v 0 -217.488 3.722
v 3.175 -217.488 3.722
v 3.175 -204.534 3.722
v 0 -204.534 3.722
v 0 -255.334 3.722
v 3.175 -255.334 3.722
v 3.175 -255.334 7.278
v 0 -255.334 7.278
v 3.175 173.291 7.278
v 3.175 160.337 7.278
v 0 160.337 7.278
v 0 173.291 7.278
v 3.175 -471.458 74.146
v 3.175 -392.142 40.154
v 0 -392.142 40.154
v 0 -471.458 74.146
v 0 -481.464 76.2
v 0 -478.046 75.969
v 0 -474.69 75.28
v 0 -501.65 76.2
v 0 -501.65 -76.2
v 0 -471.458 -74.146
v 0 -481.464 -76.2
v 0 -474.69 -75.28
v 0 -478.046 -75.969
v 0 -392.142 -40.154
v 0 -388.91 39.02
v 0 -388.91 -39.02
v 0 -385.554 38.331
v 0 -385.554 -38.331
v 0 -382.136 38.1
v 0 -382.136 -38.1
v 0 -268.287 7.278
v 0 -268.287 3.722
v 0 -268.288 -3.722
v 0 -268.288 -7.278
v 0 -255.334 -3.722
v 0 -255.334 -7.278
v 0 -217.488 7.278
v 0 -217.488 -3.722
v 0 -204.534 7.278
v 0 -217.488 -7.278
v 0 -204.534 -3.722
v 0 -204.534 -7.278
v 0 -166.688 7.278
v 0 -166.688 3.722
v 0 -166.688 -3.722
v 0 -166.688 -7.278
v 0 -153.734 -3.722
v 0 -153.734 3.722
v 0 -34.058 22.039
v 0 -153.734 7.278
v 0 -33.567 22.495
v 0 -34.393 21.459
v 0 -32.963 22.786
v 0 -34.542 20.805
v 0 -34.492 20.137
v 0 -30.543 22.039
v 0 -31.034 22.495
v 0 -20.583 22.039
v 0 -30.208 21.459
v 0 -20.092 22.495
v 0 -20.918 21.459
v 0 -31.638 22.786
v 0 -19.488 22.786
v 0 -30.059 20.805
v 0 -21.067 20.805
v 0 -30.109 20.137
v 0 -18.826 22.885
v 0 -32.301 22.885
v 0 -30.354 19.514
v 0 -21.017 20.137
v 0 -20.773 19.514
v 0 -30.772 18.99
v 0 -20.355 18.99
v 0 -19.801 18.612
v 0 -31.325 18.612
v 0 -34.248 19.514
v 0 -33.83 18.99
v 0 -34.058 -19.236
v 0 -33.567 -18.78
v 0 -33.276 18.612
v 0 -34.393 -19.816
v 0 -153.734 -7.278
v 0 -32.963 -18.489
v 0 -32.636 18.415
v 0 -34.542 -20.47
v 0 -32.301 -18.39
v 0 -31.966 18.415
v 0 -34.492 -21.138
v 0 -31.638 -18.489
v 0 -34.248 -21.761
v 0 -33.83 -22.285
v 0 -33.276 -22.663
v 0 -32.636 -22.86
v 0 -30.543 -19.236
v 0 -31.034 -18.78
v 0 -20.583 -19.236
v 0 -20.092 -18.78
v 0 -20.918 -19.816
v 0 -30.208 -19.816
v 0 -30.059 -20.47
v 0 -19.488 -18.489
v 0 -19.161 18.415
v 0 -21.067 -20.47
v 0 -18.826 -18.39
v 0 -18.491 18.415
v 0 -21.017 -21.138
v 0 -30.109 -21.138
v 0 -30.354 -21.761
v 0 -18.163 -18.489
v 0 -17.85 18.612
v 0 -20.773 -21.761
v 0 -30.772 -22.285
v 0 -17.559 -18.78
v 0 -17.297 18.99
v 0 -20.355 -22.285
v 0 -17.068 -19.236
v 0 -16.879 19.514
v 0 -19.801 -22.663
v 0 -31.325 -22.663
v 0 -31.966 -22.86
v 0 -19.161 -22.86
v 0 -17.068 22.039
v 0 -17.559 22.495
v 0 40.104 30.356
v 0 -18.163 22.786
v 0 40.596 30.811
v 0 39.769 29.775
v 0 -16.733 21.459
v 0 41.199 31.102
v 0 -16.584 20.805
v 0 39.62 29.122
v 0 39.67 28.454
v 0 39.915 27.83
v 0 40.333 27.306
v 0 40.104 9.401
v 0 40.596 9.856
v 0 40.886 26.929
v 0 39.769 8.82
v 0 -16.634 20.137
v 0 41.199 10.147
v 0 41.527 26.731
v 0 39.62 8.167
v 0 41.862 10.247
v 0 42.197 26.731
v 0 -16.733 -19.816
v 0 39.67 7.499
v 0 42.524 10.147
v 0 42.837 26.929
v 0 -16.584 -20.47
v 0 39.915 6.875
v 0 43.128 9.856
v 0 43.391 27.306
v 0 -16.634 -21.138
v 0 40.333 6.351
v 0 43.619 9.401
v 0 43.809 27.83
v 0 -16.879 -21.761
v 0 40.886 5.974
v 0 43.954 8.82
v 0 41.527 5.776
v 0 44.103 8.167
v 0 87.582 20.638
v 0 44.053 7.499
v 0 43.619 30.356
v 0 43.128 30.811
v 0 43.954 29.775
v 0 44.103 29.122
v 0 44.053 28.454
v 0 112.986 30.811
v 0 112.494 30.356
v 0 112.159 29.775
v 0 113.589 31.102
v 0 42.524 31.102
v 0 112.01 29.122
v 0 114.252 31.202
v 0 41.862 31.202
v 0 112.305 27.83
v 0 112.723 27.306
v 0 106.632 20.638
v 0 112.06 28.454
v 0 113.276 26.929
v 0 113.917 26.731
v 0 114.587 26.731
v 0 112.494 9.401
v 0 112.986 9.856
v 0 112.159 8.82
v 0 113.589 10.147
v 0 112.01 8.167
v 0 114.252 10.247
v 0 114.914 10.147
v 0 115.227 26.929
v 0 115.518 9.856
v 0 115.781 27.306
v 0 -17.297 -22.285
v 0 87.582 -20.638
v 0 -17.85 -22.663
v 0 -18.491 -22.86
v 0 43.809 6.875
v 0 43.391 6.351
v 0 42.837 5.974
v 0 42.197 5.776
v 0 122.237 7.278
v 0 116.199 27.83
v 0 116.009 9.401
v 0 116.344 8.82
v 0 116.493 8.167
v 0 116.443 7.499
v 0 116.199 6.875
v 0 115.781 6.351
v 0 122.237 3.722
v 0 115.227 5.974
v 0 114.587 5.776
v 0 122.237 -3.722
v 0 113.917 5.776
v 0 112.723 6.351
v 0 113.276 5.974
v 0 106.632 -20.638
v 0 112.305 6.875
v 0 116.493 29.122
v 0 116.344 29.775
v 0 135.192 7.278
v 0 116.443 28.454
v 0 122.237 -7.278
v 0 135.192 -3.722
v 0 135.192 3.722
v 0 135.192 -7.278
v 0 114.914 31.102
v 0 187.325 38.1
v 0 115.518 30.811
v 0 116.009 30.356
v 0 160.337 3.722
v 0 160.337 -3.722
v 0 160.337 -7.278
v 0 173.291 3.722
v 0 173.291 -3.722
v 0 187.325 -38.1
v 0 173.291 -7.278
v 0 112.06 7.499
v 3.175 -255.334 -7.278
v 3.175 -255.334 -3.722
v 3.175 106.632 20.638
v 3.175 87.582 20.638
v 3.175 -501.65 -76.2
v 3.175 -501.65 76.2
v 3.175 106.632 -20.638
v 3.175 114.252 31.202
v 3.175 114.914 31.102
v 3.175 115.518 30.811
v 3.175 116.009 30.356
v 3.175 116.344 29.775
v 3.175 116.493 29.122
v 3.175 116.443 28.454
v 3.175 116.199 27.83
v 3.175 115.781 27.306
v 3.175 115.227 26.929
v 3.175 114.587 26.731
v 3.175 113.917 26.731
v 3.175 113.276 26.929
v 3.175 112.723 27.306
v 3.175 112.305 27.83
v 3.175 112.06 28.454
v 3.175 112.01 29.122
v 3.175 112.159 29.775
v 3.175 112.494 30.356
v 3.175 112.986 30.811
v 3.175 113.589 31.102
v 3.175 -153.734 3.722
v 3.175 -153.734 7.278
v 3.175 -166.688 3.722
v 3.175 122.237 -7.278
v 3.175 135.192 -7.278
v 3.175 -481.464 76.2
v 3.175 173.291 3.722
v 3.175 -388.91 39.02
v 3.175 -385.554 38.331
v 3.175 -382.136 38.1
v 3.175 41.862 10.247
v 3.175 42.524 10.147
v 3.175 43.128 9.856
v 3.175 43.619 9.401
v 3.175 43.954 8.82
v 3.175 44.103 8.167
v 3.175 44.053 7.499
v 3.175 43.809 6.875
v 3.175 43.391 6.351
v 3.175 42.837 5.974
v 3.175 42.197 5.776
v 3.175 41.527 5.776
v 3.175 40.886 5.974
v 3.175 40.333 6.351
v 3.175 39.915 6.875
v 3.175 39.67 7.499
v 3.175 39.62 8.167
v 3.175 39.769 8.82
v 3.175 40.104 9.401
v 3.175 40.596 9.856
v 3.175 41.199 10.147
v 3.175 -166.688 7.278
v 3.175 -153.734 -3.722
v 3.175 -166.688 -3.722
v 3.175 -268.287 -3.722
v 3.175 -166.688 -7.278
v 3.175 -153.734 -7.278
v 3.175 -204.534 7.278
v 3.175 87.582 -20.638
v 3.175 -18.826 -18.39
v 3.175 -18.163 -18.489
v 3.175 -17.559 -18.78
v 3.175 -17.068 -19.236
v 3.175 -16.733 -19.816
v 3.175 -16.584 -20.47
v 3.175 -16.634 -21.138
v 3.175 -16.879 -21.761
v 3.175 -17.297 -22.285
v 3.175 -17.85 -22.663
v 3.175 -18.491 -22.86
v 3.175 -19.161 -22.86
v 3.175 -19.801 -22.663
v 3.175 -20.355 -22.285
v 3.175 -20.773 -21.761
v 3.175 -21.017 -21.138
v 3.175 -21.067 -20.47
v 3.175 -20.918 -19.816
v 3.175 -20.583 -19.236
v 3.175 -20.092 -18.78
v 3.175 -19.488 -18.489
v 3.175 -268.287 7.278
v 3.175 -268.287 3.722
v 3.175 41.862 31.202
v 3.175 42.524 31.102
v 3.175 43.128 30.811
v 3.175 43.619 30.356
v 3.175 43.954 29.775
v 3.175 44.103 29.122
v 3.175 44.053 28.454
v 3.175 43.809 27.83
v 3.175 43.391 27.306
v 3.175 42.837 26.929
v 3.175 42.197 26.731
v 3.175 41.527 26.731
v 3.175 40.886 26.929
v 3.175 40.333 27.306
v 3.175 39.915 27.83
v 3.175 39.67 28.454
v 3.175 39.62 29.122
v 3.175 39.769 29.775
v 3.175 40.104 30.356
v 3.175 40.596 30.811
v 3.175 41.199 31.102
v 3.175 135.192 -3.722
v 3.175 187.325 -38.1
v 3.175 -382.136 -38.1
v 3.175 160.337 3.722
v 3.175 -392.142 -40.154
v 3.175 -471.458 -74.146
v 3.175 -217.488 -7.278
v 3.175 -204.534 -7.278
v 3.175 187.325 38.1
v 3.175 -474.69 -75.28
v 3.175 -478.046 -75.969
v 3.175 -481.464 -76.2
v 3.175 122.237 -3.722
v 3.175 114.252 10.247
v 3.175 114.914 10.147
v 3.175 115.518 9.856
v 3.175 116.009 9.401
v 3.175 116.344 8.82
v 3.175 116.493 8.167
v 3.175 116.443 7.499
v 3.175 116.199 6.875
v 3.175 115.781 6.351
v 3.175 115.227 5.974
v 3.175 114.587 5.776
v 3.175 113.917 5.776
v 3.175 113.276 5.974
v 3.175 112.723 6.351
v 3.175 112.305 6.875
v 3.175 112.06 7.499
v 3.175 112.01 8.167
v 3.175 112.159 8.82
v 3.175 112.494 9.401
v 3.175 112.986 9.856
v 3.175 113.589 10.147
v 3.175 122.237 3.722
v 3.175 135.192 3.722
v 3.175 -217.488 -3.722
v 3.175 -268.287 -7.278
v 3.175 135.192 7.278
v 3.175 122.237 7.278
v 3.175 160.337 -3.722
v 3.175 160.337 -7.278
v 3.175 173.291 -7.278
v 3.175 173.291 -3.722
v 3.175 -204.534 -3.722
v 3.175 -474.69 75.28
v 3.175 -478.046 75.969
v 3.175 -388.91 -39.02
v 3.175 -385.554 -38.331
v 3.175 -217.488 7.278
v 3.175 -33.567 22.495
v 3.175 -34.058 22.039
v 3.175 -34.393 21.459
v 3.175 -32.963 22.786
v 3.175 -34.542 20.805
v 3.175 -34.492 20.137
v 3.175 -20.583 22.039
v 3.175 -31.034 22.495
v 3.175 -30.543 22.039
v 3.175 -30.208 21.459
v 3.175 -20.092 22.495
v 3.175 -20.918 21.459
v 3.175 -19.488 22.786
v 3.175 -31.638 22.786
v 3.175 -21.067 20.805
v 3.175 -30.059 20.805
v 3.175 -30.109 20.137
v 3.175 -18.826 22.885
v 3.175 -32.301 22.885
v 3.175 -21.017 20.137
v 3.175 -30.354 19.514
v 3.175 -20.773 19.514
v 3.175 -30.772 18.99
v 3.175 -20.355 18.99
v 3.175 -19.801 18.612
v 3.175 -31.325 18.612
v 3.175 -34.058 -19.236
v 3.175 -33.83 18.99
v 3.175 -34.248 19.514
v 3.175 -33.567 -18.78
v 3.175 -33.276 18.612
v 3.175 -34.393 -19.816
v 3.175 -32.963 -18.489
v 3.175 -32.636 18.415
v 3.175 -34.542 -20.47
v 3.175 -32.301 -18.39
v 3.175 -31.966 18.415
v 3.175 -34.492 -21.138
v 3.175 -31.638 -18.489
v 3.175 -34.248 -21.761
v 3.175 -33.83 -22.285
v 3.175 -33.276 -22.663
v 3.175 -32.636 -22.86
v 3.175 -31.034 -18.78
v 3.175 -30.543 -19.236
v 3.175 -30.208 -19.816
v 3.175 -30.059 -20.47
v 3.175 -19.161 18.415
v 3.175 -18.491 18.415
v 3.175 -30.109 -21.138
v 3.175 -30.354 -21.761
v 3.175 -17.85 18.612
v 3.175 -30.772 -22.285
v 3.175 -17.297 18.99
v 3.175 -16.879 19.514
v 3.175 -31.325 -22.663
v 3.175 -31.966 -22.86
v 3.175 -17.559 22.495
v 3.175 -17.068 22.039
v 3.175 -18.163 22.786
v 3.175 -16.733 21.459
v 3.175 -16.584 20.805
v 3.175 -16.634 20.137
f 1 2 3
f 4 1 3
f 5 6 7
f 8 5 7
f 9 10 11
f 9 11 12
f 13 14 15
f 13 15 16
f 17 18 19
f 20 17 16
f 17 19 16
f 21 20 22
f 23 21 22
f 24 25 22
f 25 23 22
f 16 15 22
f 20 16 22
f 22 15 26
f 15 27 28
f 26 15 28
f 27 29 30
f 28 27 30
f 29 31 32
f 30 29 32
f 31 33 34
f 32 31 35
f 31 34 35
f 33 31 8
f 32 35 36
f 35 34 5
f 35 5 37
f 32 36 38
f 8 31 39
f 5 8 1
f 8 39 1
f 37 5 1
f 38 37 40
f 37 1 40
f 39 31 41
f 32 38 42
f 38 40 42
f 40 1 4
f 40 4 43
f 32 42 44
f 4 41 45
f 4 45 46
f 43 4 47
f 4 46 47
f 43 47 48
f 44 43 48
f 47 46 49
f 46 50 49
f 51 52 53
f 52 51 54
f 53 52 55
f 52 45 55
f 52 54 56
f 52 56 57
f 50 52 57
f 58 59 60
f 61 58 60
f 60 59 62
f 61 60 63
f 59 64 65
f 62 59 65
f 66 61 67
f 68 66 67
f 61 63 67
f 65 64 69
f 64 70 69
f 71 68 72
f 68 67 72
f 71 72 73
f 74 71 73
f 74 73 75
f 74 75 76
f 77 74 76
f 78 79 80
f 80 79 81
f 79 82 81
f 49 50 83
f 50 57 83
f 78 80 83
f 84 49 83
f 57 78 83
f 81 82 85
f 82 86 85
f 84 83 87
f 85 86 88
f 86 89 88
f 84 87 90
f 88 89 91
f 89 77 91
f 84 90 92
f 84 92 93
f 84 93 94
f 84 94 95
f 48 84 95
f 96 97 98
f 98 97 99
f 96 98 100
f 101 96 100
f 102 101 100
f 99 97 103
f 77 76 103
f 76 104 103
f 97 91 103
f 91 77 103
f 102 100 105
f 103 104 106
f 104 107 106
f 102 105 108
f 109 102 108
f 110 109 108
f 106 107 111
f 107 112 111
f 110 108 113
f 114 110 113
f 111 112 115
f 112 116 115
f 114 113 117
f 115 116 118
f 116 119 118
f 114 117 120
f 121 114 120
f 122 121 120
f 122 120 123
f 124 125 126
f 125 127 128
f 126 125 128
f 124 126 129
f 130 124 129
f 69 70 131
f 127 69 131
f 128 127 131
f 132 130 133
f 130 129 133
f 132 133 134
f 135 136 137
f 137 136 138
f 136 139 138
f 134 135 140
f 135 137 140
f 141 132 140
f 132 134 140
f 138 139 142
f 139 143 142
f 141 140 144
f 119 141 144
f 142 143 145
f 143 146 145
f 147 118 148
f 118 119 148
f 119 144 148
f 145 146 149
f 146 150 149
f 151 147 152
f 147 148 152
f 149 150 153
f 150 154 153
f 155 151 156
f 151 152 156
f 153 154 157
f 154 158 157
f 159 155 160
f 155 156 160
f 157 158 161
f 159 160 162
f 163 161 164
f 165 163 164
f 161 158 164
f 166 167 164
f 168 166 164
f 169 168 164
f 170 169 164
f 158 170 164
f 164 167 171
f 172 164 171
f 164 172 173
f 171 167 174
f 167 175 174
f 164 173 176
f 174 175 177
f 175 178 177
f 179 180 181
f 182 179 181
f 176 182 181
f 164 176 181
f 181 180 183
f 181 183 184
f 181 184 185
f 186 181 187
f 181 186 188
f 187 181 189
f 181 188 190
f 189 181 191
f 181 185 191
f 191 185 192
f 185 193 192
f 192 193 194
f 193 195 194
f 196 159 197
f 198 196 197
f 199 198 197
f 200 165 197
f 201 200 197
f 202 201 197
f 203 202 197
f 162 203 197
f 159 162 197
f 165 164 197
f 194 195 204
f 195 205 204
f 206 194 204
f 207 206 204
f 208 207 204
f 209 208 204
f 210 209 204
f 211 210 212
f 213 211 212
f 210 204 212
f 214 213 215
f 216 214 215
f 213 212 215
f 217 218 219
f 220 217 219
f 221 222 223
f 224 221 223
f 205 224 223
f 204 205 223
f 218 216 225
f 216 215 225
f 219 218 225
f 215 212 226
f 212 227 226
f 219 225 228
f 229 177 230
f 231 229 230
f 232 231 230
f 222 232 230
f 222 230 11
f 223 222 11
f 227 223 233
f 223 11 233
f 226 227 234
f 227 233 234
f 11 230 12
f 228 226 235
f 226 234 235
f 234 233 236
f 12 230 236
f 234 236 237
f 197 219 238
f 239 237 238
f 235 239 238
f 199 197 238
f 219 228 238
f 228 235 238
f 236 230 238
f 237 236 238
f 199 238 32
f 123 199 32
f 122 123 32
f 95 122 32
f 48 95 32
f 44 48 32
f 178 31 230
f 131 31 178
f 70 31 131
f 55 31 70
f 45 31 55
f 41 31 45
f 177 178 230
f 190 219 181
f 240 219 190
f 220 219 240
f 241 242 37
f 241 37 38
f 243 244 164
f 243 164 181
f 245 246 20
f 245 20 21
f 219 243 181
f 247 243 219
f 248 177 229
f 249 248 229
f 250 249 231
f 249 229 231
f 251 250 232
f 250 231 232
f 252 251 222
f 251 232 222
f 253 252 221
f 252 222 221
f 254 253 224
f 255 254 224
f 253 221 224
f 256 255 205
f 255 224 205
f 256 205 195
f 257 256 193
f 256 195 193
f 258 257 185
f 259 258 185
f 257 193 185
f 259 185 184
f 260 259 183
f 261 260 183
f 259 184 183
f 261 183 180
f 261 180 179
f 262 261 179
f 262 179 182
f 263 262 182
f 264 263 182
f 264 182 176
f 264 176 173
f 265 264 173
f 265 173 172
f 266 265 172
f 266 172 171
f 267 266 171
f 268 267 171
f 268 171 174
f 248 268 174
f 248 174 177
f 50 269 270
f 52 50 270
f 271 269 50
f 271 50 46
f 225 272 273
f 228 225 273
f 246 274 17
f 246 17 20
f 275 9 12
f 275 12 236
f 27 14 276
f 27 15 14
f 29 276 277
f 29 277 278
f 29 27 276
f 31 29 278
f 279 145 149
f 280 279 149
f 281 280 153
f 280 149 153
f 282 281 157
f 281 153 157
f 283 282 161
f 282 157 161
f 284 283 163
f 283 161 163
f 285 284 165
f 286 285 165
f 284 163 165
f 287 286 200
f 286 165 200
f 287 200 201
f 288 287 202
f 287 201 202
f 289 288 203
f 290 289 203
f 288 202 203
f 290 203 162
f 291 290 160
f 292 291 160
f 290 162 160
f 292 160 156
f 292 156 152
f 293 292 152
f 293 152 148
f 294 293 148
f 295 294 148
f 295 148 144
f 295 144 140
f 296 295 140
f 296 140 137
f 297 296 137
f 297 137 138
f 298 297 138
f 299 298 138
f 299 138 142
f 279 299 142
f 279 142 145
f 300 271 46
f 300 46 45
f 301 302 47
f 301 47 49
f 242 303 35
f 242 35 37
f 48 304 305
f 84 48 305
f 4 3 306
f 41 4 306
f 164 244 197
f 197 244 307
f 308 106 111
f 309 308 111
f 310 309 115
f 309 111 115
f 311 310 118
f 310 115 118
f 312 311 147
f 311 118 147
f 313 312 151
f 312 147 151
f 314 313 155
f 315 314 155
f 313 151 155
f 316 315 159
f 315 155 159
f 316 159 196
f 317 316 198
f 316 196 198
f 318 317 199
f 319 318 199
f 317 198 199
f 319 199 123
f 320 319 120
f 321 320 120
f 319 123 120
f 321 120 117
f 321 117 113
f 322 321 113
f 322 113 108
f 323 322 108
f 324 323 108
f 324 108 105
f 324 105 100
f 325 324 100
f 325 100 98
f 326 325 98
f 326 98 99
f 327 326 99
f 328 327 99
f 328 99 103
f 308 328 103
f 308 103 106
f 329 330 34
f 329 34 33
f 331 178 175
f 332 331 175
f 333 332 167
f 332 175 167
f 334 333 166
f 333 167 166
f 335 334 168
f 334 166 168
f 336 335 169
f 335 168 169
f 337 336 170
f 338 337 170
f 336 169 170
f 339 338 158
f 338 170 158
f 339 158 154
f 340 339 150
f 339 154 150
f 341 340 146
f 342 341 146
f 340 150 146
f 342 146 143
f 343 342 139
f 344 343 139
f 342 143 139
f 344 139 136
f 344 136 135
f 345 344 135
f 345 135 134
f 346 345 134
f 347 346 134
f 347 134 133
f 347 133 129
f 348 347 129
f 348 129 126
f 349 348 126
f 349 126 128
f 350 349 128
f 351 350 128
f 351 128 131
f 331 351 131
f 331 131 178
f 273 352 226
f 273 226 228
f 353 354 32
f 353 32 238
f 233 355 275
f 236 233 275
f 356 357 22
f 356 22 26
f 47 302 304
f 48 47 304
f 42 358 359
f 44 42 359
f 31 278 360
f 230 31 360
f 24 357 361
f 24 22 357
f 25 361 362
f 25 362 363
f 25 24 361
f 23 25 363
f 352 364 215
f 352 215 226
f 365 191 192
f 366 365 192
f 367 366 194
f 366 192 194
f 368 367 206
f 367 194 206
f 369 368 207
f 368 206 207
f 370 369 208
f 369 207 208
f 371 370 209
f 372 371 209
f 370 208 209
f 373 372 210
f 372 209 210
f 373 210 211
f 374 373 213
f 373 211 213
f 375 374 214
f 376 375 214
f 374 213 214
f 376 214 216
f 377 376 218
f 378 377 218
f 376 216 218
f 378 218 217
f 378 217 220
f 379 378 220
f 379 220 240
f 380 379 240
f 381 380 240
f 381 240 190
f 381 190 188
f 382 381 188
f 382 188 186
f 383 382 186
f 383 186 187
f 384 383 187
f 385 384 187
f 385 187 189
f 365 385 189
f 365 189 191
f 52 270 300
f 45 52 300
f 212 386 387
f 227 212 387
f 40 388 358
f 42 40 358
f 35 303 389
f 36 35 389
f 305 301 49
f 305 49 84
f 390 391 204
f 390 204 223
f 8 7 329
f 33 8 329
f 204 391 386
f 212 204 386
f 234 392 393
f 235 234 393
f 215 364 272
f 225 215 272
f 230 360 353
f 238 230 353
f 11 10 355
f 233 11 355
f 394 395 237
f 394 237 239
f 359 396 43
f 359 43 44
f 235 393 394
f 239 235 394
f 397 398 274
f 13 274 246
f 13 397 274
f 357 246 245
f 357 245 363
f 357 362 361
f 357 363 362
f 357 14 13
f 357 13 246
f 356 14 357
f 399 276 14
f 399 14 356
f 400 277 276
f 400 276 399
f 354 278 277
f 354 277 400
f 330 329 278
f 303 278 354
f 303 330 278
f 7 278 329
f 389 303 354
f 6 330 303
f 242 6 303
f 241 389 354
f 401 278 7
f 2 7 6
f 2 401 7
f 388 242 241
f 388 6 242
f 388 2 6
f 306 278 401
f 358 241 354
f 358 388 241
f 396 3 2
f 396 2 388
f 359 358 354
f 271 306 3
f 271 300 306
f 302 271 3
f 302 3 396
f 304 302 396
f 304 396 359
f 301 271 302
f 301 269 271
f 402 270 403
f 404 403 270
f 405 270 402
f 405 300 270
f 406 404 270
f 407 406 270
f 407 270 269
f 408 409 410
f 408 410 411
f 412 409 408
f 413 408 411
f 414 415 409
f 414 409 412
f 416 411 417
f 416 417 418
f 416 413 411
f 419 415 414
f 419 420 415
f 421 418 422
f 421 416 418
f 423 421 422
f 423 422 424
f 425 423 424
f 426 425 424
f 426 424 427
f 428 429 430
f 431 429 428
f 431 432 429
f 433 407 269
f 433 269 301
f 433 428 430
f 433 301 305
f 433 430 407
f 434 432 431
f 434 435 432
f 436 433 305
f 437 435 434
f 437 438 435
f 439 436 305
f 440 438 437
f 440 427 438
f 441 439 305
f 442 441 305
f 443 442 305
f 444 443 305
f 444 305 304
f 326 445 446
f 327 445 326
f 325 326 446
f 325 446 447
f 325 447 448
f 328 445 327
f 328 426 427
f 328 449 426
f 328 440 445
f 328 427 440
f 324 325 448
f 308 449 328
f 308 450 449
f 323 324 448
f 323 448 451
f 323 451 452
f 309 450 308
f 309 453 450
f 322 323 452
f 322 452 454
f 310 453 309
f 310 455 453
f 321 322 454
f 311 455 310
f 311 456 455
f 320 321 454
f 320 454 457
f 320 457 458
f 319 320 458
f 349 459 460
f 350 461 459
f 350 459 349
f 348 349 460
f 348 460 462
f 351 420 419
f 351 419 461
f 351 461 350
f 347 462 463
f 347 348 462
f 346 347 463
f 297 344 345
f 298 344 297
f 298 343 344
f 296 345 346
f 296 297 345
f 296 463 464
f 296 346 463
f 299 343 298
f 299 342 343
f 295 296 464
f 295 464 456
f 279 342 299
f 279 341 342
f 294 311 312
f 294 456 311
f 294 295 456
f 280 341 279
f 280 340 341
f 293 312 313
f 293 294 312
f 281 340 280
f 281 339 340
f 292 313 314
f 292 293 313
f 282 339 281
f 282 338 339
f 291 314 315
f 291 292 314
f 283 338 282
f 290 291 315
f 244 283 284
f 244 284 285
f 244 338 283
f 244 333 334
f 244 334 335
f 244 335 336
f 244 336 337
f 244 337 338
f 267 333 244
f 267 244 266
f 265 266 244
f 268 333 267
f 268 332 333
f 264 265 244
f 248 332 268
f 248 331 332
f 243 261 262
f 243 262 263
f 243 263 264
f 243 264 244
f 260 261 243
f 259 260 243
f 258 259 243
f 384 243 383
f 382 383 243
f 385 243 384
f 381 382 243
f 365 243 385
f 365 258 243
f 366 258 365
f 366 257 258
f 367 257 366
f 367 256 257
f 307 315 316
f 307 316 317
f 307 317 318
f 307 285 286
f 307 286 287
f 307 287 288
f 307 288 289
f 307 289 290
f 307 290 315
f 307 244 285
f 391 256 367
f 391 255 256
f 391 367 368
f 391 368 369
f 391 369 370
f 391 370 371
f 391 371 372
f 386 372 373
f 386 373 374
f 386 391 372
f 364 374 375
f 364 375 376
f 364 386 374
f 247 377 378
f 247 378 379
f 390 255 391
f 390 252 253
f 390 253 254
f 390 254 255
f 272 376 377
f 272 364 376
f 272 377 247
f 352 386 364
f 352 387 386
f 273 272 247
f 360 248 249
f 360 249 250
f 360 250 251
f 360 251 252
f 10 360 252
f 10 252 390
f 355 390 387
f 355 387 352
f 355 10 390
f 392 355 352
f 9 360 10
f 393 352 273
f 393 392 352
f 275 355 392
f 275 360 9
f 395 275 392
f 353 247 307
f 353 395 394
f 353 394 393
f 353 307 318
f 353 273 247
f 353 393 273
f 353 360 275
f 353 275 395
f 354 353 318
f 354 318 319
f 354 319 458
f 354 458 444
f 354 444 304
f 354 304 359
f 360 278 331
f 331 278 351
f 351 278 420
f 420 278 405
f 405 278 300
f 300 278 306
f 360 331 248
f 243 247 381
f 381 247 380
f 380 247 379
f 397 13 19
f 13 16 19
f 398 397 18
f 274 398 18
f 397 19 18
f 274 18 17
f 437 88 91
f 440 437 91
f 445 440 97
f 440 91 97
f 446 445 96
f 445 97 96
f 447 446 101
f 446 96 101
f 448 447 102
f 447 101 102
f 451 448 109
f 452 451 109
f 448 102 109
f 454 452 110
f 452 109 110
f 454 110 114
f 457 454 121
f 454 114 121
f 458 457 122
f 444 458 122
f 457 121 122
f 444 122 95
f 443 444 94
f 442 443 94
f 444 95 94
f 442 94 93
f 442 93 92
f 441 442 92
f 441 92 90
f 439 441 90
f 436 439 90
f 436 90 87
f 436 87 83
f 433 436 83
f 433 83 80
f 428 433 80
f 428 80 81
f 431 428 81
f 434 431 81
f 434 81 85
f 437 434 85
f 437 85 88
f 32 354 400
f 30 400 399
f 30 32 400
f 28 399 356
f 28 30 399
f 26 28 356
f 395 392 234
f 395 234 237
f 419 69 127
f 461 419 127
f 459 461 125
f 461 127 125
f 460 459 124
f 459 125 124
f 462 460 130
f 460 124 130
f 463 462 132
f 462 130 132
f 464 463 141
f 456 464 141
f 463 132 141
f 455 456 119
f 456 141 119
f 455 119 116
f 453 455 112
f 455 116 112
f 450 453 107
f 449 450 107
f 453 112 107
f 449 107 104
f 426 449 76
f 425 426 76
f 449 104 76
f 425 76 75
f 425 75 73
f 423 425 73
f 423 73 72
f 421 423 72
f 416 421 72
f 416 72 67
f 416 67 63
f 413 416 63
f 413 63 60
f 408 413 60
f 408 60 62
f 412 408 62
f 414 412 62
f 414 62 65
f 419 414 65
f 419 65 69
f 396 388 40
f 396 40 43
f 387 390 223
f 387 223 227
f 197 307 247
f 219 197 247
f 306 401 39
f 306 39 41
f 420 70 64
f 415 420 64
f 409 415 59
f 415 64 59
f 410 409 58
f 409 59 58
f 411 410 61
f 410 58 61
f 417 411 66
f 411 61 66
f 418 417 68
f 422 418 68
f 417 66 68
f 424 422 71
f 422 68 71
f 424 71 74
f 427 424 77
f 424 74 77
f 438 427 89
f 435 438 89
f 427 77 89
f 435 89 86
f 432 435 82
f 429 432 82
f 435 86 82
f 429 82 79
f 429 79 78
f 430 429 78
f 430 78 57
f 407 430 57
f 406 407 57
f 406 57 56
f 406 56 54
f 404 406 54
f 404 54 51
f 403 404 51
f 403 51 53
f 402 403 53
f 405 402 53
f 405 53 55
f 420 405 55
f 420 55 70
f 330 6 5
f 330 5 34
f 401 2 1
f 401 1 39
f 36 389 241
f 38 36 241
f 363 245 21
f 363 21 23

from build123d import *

# Parameters (mm, degrees)
SKETCH1_W                     = 76.2
SKETCH1_H                     = 914.4
BOSS_EXTRUDE1_DEPTH           = 3.175
SKETCH2_W                     = 3.556
SKETCH2_H                     = 12.954
CUT_EXTRUDE1_DEPTH            = 4.175
LPATTERN1_COUNT               = 2
LPATTERN1_PITCH               = 50.8
LPATTERN1_COPY_1_SKETCH_W     = 3.556
LPATTERN1_COPY_1_SKETCH_H     = 12.954
LPATTERN1_COPY_1_DEPTH        = 4.175
LPATTERN1_COL_COUNT           = 2
LPATTERN1_COL_PITCH           = 50.8
LPATTERN1_COL_COPY_1_SKETCH_W = 3.556
LPATTERN1_COL_COPY_1_SKETCH_H = 12.954
LPATTERN1_COL_COPY_1_DEPTH    = 4.175
SKETCH3_W                     = 3.556
SKETCH3_H                     = 12.954
CUT_EXTRUDE2_DEPTH            = 4.175
LPATTERN2_COUNT               = 2
LPATTERN2_PITCH               = 38.1
CUT_EXTRUDE3_DEPTH            = 4.175
SKETCH5_W                     = 76.2
SKETCH5_H                     = 44.45
BOSS_EXTRUDE2_DEPTH           = 3.175
SKETCH6_W                     = 41.275
SKETCH6_H                     = 19.05
CUT_EXTRUDE4_DEPTH            = 4.175
BOSS_EXTRUDE3_DEPTH           = 3.175
FILLET1_R                     = 25.4
F_8_CLEARANCE_HOLE1_D         = 4.4958


with BuildPart() as part:
    # Sketch1 → Boss-Extrude1 (new body)
    with BuildSketch(Plane(origin=(0, 0, 0), x_dir=(0, 0, -1), z_dir=(1, 0, 0))):
        Rectangle(SKETCH1_W, SKETCH1_H)
    extrude(amount=BOSS_EXTRUDE1_DEPTH)

    # Sketch2 → Cut-Extrude1 (cut, through all)
    with BuildSketch(Plane(origin=(3.175, 0, 0), x_dir=(0, 0, -1), z_dir=(1, 0, 0))):
        with Locations((5.499997, -211.0105)):
            Rectangle(SKETCH2_W, SKETCH2_H)
    cut_extrude1 = extrude(amount=-CUT_EXTRUDE1_DEPTH, mode=Mode.SUBTRACT)

    # Mirror1: Cut-Extrude1 across plane
    add(cut_extrude1.mirror(Plane.XY), mode=Mode.SUBTRACT)

    # LPattern1: Cut-Extrude1 ×2
    with Locations(*[(0, i * LPATTERN1_PITCH, 0) for i in range(1, LPATTERN1_COUNT)]):
        add(cut_extrude1, mode=Mode.SUBTRACT)

    # LPattern1 copy 1 sketch → LPattern1 copy 1 (cut, through all)
    with BuildSketch(Plane(origin=(3.175, 50.8, 0), x_dir=(0, 0, 1), z_dir=(1, 0, 0))):
        with Locations((5.499997, 211.0105)):
            Rectangle(LPATTERN1_COPY_1_SKETCH_W, LPATTERN1_COPY_1_SKETCH_H)
    extrude(amount=-LPATTERN1_COPY_1_DEPTH, mode=Mode.SUBTRACT)

    # LPattern1 col: Cut-Extrude1 ×2
    with Locations(*[(0, -i * LPATTERN1_COL_PITCH, 0) for i in range(1, LPATTERN1_COL_COUNT)]):
        add(cut_extrude1, mode=Mode.SUBTRACT)

    # LPattern1 col copy 1 sketch → LPattern1 col copy 1 (cut, through all)
    with BuildSketch(Plane(origin=(3.175, -50.8, 0), x_dir=(0, 0, 1), z_dir=(1, 0, 0))):
        with Locations((5.499997, 211.0105)):
            Rectangle(LPATTERN1_COL_COPY_1_SKETCH_W, LPATTERN1_COL_COPY_1_SKETCH_H)
    extrude(amount=-LPATTERN1_COL_COPY_1_DEPTH, mode=Mode.SUBTRACT)

    # Sketch3 → Cut-Extrude2 (cut, through all)
    with BuildSketch(Plane(origin=(3.175, 0, 0), x_dir=(0, 0, -1), z_dir=(1, 0, 0))):
        with Locations((5.499997, 128.7145)):
            Rectangle(SKETCH3_W, SKETCH3_H)
        with Locations((-5.499997, 128.7145)):
            Rectangle(SKETCH3_W, SKETCH3_H)
    cut_extrude2 = extrude(amount=-CUT_EXTRUDE2_DEPTH, mode=Mode.SUBTRACT)

    # LPattern2: Cut-Extrude2 ×2
    with Locations(*[(0, i * LPATTERN2_PITCH, 0) for i in range(1, LPATTERN2_COUNT)]):
        add(cut_extrude2, mode=Mode.SUBTRACT)

    # Sketch4 → Cut-Extrude3 (cut, through all)
    with BuildSketch(Plane(origin=(3.175, 0, 0), x_dir=(0, 0, -1), z_dir=(1, 0, 0))):
        Polygon((-38.1, 187.325), (0, 187.325), (38.1, 187.325), (38.1, 457.2), (-38.1, 457.2), align=None)
    extrude(amount=-CUT_EXTRUDE3_DEPTH, mode=Mode.SUBTRACT)

    # Sketch5 → Boss-Extrude2 (add)
    with BuildSketch(Plane(origin=(3.175, 0, 0), x_dir=(0, 0, -1), z_dir=(1, 0, 0))):
        with Locations((0, -479.425)):
            Rectangle(SKETCH5_W, SKETCH5_H)
    extrude(amount=-BOSS_EXTRUDE2_DEPTH)

    # Sketch6 → Cut-Extrude4 (cut, through all)
    with BuildSketch(Plane(origin=(3.175, 0, 0), x_dir=(0, 0, -1), z_dir=(1, 0, 0))):
        with Locations((0, 97.106805088)):
            Rectangle(SKETCH6_W, SKETCH6_H)
    extrude(amount=-CUT_EXTRUDE4_DEPTH, mode=Mode.SUBTRACT)

    # Sketch7 → Boss-Extrude3 (add)
    with BuildSketch(Plane(origin=(3.175, 0, 0), x_dir=(0, 0, -1), z_dir=(1, 0, 0))):
        Polygon((-76.2, -501.65), (76.2, -501.65), (76.2, -476.25), (38.1, -387.35), (-38.1, -387.35), (-76.2, -476.25), align=None)
    extrude(amount=-BOSS_EXTRUDE3_DEPTH)

    # Fillet1
    fillet1_edges = [part.edges().sort_by_distance(p)[0] for p in [
        (1.5875, -476.25, 76.2),
        (1.5875, -387.35, 38.1),
        (1.5875, -387.35, -38.1),
        (1.5875, -476.25, -76.2),
    ]]
    fillet(fillet1_edges, radius=FILLET1_R)

    # #8 Clearance Hole1 (through all)
    with Locations(Plane(origin=(3.175, 0, 0), x_dir=(0, 0, -1), z_dir=(1, 0, 0))):
        with Locations((-7.998961309, 41.861805088), (-28.953961309, 41.861805088), (20.6375, -18.825765594), (-20.6375, -18.825765594), (20.6375, -32.300765594), (-20.6375, -32.300765594), (-7.998961309, 114.251805088), (-28.953961309, 114.251805088)):
            Hole(F_8_CLEARANCE_HOLE1_D / 2)


solid = part.part
